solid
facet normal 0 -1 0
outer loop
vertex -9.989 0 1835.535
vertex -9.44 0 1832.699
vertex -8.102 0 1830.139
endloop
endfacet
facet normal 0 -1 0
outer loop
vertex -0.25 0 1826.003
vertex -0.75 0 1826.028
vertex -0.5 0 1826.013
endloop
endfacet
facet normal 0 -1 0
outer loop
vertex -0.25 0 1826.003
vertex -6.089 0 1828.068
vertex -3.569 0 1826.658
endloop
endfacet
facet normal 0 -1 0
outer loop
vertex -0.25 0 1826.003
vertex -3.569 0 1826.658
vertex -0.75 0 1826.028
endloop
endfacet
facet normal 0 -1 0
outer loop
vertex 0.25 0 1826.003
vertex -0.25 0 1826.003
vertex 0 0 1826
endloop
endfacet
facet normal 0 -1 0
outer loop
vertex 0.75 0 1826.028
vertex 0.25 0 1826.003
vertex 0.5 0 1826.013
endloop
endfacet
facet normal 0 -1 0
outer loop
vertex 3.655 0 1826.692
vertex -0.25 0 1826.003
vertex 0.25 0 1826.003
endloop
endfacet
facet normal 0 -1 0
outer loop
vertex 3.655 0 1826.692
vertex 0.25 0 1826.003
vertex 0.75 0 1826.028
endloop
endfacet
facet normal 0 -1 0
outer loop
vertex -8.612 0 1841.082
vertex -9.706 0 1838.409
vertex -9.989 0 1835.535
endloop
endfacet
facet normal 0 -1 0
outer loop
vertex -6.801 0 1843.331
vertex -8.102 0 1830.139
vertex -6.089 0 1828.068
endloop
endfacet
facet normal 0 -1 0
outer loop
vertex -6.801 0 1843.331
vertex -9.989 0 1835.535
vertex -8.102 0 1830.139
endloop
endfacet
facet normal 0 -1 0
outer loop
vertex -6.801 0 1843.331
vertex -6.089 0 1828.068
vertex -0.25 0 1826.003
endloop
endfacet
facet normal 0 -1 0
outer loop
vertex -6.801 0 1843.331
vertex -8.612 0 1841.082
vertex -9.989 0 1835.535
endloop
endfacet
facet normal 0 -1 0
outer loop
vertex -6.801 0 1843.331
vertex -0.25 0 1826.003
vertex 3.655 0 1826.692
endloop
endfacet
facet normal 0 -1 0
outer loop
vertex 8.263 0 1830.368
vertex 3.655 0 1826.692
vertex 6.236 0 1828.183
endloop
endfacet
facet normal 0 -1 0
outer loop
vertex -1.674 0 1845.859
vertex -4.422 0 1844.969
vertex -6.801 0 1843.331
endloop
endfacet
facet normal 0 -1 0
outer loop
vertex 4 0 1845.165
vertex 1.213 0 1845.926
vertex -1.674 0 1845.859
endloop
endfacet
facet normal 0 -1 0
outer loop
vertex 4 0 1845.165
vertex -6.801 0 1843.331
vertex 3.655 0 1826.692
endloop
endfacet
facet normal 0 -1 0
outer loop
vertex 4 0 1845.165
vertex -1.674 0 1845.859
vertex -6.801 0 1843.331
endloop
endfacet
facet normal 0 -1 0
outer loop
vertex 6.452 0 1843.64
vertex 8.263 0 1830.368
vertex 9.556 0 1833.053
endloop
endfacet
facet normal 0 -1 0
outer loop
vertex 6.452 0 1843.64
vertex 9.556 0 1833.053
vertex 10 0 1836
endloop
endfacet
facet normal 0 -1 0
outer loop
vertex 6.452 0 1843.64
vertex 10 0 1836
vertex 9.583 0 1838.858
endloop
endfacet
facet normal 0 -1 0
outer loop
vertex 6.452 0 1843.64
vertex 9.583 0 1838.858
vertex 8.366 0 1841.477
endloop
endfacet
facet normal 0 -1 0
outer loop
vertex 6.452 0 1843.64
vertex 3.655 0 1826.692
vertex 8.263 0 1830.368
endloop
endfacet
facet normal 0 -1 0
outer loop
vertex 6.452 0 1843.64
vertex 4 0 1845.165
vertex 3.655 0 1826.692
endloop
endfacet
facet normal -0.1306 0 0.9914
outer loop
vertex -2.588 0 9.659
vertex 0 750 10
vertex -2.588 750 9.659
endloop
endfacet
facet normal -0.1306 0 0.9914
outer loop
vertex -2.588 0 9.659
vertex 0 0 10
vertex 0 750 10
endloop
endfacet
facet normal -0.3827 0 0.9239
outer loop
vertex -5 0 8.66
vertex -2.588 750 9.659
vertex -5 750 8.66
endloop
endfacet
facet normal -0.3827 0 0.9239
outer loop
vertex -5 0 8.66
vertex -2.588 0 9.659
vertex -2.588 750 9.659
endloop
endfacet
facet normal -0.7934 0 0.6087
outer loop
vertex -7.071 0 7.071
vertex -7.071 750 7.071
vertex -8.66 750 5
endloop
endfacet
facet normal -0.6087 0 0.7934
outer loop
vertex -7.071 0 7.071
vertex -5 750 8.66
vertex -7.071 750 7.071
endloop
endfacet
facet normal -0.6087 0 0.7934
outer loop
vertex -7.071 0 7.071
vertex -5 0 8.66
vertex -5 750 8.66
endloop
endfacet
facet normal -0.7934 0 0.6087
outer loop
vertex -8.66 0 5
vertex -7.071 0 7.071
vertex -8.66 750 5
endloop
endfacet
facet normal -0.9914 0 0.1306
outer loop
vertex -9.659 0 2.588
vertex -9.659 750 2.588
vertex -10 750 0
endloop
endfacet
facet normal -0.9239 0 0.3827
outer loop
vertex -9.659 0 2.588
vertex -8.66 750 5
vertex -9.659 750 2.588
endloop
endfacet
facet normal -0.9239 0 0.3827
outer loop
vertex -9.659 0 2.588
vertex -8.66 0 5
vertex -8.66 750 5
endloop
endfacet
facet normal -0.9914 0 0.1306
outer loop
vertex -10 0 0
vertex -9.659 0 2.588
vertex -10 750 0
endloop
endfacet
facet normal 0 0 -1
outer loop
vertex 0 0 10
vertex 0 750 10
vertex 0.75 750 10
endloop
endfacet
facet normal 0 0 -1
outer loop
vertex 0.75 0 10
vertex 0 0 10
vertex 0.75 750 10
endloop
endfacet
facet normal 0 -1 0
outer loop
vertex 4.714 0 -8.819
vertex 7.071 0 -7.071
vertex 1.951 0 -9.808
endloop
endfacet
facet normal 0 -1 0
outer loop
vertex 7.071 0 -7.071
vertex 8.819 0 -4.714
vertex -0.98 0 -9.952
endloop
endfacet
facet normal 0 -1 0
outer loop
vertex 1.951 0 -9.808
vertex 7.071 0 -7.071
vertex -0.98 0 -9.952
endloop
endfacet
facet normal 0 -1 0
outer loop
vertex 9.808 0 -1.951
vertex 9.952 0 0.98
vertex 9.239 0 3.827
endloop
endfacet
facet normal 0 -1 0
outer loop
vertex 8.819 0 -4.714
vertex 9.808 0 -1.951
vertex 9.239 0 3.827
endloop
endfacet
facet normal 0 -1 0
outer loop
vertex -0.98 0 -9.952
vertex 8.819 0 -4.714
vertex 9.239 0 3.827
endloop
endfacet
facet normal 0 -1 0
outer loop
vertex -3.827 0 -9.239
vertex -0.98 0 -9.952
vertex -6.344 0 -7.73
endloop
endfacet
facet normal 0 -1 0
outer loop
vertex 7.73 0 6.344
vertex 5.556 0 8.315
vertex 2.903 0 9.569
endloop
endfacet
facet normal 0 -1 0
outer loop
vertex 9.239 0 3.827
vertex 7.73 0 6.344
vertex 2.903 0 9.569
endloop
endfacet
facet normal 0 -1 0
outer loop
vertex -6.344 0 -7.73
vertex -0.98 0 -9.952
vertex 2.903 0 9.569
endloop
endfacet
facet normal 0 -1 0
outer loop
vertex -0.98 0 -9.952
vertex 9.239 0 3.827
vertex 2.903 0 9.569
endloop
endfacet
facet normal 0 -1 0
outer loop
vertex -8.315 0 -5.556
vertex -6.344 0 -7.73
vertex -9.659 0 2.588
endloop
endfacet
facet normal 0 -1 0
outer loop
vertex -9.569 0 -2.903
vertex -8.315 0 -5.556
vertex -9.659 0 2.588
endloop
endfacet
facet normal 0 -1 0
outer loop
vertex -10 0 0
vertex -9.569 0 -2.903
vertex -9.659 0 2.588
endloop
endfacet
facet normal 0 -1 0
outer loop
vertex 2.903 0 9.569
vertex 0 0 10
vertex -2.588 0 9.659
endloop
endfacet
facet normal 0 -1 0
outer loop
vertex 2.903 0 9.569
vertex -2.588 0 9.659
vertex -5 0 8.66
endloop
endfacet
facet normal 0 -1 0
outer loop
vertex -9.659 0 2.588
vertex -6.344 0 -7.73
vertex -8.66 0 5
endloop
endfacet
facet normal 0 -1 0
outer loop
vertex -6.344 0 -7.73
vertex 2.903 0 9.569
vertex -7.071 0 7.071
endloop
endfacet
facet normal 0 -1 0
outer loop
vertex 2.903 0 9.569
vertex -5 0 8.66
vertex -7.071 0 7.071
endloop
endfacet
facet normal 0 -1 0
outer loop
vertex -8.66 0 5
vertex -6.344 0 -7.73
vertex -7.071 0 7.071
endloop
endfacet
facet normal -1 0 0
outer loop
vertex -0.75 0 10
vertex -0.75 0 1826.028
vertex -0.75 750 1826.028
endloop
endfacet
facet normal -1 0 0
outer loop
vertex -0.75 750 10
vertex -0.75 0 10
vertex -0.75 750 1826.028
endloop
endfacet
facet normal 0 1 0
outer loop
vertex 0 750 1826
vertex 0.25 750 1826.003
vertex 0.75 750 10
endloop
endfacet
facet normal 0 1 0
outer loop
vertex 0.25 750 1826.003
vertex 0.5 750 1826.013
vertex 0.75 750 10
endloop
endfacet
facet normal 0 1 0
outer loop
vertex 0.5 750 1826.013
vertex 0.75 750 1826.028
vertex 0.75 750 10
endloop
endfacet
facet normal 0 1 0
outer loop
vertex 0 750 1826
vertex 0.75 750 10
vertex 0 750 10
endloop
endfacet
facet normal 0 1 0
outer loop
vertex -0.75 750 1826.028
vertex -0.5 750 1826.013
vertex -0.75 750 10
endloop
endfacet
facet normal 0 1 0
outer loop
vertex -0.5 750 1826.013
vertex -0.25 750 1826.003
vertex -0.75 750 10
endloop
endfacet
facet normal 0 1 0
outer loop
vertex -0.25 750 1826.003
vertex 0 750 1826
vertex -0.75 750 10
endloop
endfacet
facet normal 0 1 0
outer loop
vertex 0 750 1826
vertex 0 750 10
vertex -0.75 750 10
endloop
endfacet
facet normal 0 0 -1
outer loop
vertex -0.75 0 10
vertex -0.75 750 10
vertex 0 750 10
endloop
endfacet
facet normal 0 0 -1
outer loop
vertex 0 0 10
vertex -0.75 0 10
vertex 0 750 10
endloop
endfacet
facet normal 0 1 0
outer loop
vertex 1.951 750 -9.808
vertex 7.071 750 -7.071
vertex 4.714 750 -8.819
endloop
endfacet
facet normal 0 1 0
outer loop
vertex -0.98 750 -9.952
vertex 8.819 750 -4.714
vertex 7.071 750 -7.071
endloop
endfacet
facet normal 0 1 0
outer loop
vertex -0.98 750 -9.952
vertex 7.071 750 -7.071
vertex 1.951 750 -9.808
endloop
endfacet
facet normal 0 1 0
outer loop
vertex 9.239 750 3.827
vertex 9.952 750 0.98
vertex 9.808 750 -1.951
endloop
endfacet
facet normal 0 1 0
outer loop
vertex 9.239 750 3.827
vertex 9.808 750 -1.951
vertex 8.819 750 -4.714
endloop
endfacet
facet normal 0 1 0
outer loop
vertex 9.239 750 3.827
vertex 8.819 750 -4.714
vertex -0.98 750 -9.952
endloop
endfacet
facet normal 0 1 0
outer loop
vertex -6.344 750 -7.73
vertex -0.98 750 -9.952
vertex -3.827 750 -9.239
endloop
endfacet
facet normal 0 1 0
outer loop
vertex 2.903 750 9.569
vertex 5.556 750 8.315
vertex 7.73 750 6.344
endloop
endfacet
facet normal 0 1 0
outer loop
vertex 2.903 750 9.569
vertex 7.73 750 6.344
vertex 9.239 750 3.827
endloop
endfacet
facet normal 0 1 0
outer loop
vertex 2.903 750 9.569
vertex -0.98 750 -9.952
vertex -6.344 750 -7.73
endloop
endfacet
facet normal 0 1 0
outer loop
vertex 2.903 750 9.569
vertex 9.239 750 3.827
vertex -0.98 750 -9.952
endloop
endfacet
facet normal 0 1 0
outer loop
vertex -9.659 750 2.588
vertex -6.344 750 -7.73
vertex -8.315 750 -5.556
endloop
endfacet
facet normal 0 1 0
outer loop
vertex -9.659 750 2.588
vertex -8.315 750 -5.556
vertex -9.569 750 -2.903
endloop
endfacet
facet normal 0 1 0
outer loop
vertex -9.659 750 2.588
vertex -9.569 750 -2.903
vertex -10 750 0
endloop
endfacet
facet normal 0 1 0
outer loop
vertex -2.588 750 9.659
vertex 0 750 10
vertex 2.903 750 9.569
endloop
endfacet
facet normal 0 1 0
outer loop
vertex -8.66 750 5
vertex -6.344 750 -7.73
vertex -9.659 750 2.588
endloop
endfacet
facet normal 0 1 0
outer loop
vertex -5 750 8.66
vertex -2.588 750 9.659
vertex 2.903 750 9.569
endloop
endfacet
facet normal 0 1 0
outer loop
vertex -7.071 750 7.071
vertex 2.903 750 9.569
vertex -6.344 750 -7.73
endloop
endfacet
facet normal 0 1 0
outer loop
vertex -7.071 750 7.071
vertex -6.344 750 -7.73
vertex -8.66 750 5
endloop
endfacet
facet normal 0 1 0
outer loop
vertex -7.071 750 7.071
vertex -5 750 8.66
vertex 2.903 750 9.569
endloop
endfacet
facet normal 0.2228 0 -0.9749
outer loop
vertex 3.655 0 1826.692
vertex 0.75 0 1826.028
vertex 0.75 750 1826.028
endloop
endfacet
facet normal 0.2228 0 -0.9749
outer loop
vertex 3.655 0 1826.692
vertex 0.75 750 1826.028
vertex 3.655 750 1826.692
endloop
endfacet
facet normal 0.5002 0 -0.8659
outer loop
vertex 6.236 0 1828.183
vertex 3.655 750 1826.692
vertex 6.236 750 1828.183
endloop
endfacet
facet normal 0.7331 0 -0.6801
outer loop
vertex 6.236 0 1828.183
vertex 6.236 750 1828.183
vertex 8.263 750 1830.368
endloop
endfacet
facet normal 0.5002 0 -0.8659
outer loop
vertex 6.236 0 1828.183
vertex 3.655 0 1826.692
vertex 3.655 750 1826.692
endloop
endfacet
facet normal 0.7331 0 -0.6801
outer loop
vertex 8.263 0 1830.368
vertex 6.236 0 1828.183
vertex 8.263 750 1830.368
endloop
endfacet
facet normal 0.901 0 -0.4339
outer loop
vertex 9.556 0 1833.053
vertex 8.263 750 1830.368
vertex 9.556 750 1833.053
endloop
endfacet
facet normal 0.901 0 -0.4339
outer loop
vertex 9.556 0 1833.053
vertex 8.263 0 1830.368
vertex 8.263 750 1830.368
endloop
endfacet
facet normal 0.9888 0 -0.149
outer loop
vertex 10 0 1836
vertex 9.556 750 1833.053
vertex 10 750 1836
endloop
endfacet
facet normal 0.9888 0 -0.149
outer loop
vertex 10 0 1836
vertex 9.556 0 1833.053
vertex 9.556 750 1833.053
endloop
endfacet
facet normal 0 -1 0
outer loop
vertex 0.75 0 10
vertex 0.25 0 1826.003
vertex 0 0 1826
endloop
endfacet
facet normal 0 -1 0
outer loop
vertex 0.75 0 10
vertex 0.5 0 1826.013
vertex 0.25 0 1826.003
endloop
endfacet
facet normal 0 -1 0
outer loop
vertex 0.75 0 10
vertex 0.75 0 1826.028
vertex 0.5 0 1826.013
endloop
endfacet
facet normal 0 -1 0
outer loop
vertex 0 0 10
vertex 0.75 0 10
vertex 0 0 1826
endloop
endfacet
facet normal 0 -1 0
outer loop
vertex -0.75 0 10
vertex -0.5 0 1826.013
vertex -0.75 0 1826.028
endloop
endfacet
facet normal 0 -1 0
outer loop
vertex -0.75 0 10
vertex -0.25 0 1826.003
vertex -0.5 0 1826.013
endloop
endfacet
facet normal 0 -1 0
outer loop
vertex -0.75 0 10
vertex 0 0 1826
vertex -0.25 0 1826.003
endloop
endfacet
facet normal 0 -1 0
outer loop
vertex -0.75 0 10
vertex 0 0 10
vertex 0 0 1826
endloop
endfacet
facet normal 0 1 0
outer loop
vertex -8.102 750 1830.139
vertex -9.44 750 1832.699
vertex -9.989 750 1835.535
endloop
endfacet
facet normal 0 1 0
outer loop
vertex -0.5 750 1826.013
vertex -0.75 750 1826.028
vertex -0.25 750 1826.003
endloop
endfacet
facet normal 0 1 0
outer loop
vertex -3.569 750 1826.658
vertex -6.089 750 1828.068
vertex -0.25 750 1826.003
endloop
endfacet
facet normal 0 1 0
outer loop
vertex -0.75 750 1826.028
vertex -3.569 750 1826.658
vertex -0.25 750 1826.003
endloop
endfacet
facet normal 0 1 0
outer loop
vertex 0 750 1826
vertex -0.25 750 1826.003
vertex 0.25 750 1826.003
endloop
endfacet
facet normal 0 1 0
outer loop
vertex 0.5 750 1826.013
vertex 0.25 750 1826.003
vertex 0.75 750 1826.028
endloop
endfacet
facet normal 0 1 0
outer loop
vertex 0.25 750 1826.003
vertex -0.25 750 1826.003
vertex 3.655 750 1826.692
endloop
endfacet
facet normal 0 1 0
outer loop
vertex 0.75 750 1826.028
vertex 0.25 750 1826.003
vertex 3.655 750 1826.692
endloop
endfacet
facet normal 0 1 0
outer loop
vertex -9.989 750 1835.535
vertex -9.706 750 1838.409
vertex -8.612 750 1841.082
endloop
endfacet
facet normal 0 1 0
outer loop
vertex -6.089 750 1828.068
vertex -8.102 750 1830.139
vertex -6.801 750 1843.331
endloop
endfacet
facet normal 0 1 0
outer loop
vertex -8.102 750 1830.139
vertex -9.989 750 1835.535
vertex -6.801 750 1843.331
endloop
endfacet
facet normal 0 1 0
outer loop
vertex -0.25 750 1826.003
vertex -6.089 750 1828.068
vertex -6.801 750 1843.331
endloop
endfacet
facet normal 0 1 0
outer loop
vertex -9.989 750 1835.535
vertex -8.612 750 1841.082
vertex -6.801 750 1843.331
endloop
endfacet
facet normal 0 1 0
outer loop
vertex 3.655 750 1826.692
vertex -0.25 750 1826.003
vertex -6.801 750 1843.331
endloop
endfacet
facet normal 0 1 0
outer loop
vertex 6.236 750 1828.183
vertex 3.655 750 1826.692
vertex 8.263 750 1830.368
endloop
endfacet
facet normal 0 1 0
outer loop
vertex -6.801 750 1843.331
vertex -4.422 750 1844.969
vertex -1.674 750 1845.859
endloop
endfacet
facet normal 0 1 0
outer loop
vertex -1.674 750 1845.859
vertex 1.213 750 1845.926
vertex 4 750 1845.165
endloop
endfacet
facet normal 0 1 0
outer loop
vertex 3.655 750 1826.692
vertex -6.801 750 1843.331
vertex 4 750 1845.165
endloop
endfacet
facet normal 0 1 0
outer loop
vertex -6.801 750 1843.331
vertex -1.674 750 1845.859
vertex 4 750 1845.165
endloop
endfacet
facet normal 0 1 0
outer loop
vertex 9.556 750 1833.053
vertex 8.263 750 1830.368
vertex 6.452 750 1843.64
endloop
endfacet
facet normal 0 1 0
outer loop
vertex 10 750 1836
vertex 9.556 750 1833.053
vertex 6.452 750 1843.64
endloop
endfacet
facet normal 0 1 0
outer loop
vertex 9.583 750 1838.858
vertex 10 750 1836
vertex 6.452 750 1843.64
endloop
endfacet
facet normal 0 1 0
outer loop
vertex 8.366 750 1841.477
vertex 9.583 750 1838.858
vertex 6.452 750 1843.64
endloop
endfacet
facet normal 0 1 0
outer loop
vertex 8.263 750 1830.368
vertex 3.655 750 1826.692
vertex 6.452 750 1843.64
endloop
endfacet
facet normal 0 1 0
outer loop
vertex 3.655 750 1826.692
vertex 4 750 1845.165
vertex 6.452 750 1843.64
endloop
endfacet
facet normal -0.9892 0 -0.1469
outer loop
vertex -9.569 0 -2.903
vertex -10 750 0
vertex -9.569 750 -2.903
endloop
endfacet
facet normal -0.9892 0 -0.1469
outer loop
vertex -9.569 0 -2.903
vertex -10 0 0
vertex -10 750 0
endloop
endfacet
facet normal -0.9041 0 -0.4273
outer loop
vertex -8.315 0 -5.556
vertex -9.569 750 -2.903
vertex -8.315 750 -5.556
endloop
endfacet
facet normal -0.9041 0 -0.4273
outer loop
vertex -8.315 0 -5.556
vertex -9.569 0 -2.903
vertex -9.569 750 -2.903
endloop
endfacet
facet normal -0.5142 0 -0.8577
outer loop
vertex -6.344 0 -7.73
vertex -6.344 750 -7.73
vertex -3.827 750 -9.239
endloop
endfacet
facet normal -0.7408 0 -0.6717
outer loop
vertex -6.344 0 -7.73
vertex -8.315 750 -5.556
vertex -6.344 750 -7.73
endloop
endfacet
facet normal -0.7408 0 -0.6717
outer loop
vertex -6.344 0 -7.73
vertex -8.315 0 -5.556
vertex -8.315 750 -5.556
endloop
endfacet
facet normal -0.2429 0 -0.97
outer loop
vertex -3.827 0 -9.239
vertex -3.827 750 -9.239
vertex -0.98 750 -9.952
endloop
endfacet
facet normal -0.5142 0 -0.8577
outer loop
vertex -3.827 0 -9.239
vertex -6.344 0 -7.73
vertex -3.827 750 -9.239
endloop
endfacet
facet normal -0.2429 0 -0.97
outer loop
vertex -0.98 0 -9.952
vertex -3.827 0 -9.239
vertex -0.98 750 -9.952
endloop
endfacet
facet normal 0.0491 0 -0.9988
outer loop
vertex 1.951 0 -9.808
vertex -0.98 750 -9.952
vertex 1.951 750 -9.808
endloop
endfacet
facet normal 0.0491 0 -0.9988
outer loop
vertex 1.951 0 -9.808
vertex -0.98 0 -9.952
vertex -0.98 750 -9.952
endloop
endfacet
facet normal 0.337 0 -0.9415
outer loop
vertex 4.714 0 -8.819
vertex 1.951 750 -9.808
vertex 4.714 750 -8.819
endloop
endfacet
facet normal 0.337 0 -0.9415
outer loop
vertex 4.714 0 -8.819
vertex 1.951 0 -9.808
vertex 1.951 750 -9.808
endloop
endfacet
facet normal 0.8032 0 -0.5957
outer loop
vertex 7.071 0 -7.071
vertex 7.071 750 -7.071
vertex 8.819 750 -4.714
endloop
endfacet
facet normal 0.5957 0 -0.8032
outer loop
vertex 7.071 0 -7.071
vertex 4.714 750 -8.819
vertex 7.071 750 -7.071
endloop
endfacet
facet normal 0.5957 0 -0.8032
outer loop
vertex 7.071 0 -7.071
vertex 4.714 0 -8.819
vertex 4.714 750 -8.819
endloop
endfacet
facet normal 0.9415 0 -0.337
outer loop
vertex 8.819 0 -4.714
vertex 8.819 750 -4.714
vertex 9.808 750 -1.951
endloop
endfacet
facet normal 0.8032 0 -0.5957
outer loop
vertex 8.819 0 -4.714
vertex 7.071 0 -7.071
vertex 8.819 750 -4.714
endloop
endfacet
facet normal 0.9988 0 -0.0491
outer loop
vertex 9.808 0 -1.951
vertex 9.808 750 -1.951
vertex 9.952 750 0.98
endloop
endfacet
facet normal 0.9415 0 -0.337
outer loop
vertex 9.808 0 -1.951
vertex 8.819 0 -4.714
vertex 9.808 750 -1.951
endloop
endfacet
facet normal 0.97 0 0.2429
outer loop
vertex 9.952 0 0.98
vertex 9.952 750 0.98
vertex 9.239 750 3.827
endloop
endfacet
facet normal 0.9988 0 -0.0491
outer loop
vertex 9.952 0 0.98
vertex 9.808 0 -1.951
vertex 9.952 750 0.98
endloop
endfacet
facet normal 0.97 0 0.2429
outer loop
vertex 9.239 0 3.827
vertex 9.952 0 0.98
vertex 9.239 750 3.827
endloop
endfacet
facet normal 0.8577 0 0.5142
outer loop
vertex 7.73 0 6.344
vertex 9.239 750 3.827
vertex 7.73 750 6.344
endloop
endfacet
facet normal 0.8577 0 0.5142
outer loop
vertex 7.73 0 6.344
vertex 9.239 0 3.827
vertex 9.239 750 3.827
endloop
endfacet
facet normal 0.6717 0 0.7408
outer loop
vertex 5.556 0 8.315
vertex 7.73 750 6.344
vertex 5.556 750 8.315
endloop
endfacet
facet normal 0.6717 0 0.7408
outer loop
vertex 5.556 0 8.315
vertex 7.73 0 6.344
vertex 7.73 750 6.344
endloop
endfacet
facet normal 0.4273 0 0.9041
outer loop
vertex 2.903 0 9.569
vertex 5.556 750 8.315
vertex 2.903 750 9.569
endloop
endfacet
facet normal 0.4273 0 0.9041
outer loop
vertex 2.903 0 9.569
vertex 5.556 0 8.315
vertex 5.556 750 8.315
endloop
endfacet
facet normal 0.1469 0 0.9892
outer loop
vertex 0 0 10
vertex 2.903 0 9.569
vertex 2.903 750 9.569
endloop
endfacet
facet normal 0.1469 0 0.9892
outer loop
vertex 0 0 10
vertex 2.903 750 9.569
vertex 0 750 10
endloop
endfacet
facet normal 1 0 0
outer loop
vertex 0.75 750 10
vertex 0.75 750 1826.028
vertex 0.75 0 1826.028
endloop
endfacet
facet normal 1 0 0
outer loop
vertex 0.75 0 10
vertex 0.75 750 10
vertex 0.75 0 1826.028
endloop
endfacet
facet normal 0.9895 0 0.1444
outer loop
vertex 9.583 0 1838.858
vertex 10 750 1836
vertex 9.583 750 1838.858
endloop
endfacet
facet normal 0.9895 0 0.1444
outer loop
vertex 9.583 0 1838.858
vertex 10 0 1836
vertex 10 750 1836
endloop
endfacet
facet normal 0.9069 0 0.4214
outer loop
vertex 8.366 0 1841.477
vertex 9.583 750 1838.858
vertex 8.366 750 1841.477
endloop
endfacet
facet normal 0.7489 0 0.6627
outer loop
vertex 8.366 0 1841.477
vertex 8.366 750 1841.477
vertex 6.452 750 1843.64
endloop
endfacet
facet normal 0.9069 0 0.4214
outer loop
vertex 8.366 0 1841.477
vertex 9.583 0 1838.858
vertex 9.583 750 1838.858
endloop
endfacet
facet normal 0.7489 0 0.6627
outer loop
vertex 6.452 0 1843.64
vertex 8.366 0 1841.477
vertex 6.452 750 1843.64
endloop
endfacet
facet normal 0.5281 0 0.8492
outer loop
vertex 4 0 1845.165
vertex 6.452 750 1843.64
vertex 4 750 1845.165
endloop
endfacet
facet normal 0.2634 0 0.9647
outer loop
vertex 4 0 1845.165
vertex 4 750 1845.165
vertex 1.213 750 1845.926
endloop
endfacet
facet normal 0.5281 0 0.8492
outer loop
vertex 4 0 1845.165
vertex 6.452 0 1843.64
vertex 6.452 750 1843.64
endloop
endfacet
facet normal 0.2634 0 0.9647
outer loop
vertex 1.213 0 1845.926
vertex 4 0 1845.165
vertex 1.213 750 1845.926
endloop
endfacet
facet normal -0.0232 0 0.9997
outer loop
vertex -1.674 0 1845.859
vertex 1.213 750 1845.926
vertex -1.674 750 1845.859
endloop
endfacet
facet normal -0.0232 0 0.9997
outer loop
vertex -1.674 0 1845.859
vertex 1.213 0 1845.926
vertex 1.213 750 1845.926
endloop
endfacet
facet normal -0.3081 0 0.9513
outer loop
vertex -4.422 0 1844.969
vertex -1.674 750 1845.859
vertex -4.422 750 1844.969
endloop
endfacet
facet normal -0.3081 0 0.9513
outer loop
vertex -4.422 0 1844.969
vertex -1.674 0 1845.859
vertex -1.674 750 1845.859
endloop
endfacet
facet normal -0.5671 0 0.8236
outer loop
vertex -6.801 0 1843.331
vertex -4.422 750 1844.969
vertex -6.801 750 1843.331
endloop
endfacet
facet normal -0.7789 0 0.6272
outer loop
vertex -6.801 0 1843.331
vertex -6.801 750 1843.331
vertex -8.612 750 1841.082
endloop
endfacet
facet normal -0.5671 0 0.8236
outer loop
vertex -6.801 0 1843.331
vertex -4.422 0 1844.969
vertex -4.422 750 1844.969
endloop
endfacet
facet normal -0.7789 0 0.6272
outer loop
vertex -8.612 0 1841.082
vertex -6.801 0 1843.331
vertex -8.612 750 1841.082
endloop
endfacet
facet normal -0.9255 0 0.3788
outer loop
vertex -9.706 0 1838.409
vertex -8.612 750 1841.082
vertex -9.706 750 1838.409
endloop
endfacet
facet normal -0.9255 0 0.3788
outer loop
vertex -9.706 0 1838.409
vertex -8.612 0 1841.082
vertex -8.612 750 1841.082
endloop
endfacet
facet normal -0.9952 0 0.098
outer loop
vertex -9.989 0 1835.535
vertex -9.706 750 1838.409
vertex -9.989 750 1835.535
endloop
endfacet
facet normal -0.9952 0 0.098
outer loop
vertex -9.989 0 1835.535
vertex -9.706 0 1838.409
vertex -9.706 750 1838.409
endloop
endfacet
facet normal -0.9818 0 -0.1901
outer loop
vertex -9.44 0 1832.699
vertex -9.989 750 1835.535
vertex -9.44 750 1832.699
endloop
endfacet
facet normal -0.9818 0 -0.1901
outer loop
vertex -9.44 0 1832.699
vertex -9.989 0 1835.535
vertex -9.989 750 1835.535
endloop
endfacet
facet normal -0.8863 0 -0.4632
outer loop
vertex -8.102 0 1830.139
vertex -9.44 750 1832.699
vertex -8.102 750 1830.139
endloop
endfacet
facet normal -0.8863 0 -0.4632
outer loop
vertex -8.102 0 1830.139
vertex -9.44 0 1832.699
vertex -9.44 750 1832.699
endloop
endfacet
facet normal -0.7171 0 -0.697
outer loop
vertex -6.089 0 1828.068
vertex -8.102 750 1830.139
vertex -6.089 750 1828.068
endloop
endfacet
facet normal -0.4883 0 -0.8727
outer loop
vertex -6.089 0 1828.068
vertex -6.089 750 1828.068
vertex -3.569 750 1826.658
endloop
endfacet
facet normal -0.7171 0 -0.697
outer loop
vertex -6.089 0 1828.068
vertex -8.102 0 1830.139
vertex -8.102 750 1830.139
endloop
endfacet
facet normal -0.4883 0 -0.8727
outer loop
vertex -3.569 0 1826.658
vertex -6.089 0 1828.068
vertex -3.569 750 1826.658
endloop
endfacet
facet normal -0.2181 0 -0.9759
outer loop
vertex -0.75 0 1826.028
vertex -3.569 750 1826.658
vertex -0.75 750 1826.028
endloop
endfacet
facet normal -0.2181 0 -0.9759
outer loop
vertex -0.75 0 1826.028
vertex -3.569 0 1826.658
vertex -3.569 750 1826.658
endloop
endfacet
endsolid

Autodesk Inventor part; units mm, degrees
ref_plane "YZ Plane" through (0, 0, 0) normal (1, 0, 0) x (0, 1, 0)
ref_plane "XZ Plane" through (0, 0, 0) normal (0, 1, 0) x (-1, 0, 0)
sketch "Sketch1" plane through (0, 0, 0) normal (0, 1, 0) x (-1, 0, 0)
  circle A0 centre (0, 0) radius 10
  dimension "d0" = 20
extrude "Extrusion1" add sketch "Sketch1" along normal blind 750
sketch "Sketch2" plane through (0, 0, 0) normal (0, -1, 0) x (1, 0, 0)
  circle A0 centre (0, 0) radius 10 projected
  line L0 (0, 10) -> (0, 1826)
  circle A1 centre (0, 1836) radius 10
  dimension "d4" = 20
  dimension "d14" = 1856
  dimension "d5" = 10
  dimension "d6" = 0
extrude "Extrusion2" add sketch "Sketch2" against normal blind 750 contours A1
ref_plane "Work Plane1" through (0, 0, 10) normal (0, 0, 1) x (1, 0, 0)
sketch "Sketch3" plane through (0, 0, 10) normal (0, 0, 1) x (1, 0, 0)
  line L0 (10, 750) -> (-10, 750) projected
  line L1 (-0.75, 750) -> (0.75, 750)
  line L2 (0.75, 750) -> (0.75, 0)
  line L3 (0.75, 0) -> (-0.75, 0)
  line L4 (-0.75, 0) -> (-0.75, 750)
  line L5 (10, 0) -> (10, 750) projected
  point P0 (0, 0)
  dimension "d9" = 1.5
  dimension "d10" = 750
  dimension "d11" = 9.25
extrude "Extrusion3" add sketch "Sketch3" along normal up to surface
properties part number "Sail"
